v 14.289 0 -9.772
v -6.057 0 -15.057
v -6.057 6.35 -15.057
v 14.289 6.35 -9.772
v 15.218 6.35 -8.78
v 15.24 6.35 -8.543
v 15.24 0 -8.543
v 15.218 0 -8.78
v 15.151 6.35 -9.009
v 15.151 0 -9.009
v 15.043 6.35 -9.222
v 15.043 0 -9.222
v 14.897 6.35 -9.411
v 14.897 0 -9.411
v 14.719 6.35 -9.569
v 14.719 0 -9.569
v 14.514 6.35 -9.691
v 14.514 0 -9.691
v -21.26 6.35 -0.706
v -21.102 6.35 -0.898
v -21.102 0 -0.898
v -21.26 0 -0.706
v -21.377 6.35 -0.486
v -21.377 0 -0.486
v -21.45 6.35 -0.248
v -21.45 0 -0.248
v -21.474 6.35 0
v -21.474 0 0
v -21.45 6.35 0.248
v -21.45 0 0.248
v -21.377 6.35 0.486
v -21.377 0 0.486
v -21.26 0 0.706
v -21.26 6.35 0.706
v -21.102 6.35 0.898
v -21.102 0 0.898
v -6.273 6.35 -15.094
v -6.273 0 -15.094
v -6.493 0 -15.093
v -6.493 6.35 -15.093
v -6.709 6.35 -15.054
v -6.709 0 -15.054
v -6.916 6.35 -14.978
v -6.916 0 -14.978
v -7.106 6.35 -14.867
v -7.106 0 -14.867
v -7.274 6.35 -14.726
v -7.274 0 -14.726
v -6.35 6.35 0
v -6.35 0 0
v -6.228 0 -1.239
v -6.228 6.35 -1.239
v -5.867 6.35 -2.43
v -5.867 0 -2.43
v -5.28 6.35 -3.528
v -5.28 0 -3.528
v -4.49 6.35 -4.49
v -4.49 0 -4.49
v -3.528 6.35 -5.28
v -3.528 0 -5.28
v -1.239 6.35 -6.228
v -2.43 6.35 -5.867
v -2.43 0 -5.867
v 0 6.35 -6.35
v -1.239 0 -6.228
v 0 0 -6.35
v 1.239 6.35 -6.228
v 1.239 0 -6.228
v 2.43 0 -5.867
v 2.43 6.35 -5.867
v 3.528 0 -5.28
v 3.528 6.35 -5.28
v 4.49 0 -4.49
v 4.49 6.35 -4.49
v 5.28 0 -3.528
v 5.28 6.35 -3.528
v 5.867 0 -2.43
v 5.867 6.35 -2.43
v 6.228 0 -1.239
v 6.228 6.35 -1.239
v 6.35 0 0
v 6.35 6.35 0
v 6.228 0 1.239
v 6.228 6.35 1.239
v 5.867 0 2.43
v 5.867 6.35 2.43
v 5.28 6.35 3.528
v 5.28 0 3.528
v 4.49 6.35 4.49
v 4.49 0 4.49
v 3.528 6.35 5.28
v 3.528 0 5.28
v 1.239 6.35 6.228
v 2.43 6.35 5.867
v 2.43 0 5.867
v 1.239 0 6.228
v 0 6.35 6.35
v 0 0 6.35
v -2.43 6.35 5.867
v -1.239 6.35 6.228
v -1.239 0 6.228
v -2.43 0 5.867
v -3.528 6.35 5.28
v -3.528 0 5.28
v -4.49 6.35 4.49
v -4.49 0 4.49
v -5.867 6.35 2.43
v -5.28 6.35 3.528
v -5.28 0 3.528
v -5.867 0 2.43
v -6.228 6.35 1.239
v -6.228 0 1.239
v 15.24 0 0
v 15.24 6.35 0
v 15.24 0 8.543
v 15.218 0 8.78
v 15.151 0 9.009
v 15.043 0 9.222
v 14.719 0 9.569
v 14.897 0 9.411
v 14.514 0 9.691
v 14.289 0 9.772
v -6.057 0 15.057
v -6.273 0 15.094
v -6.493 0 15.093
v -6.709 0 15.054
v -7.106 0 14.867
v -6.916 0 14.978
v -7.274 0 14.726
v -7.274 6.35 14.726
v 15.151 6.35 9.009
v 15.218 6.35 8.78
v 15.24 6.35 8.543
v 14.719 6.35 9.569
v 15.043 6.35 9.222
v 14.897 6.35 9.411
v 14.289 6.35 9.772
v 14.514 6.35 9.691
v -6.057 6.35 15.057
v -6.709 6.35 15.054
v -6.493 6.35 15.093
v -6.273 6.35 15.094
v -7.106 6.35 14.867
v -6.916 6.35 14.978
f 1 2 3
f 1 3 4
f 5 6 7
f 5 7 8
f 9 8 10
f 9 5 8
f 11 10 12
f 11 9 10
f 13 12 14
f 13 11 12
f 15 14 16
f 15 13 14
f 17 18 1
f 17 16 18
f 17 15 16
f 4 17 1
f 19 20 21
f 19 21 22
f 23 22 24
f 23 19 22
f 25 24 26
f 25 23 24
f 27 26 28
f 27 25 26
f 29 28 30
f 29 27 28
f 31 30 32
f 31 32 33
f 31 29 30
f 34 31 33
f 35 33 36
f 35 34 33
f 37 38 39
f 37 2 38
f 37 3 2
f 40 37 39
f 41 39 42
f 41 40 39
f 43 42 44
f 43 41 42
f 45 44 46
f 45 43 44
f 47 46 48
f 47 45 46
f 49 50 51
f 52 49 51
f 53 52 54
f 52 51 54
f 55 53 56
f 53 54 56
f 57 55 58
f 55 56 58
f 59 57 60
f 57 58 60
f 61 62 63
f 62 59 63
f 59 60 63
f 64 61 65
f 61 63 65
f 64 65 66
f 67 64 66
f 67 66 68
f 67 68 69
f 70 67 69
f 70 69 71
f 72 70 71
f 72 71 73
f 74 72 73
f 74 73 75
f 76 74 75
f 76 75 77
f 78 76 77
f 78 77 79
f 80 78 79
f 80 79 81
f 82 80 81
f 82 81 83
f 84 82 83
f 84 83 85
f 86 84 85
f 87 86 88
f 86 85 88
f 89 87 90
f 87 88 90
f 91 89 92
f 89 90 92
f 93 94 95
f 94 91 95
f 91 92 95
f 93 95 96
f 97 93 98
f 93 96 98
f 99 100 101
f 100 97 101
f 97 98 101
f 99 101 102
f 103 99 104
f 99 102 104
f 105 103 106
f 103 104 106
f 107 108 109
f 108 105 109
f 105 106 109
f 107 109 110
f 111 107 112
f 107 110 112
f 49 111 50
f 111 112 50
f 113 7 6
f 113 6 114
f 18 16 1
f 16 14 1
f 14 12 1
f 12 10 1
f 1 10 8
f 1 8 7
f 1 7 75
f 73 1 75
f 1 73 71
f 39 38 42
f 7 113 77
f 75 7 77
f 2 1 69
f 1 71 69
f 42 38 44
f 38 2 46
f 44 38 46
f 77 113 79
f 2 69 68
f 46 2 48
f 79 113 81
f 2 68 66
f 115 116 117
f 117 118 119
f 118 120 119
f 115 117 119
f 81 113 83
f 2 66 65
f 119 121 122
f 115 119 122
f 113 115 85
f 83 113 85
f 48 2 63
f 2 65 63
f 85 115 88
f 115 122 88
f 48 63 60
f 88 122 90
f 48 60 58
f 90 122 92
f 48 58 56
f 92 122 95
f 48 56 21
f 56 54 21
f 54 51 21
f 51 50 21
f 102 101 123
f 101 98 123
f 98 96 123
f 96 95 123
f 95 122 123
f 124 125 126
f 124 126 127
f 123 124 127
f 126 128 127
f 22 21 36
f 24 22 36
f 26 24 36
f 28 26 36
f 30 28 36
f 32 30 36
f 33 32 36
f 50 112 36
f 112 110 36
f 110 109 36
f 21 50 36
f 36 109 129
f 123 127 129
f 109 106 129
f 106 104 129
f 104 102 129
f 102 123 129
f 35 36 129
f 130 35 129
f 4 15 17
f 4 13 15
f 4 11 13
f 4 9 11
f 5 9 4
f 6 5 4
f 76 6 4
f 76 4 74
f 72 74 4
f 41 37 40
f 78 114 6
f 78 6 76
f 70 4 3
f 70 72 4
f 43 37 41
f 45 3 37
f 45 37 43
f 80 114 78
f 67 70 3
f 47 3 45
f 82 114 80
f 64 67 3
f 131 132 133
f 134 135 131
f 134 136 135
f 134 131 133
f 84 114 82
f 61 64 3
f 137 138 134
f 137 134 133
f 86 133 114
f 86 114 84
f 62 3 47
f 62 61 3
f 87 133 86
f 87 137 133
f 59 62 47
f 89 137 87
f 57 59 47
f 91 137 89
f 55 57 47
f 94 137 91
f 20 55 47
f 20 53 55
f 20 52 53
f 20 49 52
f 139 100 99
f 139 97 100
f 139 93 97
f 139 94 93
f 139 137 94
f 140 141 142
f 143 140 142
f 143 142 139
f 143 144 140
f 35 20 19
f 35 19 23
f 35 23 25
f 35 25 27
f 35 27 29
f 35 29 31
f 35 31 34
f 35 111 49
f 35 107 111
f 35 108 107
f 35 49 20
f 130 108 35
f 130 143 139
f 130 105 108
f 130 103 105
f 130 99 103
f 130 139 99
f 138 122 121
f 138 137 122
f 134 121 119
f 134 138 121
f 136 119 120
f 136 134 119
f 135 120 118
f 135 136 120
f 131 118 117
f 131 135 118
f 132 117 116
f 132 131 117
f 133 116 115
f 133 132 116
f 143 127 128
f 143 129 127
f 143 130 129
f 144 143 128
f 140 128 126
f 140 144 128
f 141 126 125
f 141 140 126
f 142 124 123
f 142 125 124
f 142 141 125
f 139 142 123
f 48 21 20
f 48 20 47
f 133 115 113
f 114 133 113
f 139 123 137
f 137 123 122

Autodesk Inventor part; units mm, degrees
ref_plane "YZ Plane" through (0, 0, 0) normal (1, 0, 0) x (0, 1, 0)
ref_plane "XZ Plane" through (0, 0, 0) normal (0, 1, 0) x (-1, 0, 0)
ref_plane "XY Plane" through (0, 0, 0) normal (0, 0, 1) x (1, 0, 0)
sketch "Sketch1" plane through (0, 0, 0) normal (0, 1, 0) x (-1, 0, 0)
  circle A0 centre (0, 0) radius 6.35
  line L0 (22, 0) -> (6.76, 15.24)
  line L1 (6.76, 15.24) -> (-15.24, 9.525)
  line L2 (-15.24, 9.525) -> (-15.24, 0)
  line L3 (22, 0) -> (0, 0)
  line L4 (22, 0) -> (6.76, -15.24)
  line L5 (6.76, -15.24) -> (-15.24, -9.525)
  line L6 (-15.24, -9.525) -> (-15.24, 0)
  dimension "d0" = 12.7
  dimension "d1" = 22
  dimension "d2" = 15.24
  dimension "d3" = 45
  dimension "d4" = 15.24
  dimension "d5" = 9.525
extrude "Extrusion1" add sketch "Sketch1" along normal blind 6.35
fillet "Fillet1" radius 1.27 5 edges at (-22, 3.175, 0) (-6.76, 3.175, 15.24) (-6.76, 3.175, -15.24) (15.24, 3.175, 9.525) (15.24, 3.175, -9.525)
properties part number "ALIGNMENT JIG 2SCREEN"
